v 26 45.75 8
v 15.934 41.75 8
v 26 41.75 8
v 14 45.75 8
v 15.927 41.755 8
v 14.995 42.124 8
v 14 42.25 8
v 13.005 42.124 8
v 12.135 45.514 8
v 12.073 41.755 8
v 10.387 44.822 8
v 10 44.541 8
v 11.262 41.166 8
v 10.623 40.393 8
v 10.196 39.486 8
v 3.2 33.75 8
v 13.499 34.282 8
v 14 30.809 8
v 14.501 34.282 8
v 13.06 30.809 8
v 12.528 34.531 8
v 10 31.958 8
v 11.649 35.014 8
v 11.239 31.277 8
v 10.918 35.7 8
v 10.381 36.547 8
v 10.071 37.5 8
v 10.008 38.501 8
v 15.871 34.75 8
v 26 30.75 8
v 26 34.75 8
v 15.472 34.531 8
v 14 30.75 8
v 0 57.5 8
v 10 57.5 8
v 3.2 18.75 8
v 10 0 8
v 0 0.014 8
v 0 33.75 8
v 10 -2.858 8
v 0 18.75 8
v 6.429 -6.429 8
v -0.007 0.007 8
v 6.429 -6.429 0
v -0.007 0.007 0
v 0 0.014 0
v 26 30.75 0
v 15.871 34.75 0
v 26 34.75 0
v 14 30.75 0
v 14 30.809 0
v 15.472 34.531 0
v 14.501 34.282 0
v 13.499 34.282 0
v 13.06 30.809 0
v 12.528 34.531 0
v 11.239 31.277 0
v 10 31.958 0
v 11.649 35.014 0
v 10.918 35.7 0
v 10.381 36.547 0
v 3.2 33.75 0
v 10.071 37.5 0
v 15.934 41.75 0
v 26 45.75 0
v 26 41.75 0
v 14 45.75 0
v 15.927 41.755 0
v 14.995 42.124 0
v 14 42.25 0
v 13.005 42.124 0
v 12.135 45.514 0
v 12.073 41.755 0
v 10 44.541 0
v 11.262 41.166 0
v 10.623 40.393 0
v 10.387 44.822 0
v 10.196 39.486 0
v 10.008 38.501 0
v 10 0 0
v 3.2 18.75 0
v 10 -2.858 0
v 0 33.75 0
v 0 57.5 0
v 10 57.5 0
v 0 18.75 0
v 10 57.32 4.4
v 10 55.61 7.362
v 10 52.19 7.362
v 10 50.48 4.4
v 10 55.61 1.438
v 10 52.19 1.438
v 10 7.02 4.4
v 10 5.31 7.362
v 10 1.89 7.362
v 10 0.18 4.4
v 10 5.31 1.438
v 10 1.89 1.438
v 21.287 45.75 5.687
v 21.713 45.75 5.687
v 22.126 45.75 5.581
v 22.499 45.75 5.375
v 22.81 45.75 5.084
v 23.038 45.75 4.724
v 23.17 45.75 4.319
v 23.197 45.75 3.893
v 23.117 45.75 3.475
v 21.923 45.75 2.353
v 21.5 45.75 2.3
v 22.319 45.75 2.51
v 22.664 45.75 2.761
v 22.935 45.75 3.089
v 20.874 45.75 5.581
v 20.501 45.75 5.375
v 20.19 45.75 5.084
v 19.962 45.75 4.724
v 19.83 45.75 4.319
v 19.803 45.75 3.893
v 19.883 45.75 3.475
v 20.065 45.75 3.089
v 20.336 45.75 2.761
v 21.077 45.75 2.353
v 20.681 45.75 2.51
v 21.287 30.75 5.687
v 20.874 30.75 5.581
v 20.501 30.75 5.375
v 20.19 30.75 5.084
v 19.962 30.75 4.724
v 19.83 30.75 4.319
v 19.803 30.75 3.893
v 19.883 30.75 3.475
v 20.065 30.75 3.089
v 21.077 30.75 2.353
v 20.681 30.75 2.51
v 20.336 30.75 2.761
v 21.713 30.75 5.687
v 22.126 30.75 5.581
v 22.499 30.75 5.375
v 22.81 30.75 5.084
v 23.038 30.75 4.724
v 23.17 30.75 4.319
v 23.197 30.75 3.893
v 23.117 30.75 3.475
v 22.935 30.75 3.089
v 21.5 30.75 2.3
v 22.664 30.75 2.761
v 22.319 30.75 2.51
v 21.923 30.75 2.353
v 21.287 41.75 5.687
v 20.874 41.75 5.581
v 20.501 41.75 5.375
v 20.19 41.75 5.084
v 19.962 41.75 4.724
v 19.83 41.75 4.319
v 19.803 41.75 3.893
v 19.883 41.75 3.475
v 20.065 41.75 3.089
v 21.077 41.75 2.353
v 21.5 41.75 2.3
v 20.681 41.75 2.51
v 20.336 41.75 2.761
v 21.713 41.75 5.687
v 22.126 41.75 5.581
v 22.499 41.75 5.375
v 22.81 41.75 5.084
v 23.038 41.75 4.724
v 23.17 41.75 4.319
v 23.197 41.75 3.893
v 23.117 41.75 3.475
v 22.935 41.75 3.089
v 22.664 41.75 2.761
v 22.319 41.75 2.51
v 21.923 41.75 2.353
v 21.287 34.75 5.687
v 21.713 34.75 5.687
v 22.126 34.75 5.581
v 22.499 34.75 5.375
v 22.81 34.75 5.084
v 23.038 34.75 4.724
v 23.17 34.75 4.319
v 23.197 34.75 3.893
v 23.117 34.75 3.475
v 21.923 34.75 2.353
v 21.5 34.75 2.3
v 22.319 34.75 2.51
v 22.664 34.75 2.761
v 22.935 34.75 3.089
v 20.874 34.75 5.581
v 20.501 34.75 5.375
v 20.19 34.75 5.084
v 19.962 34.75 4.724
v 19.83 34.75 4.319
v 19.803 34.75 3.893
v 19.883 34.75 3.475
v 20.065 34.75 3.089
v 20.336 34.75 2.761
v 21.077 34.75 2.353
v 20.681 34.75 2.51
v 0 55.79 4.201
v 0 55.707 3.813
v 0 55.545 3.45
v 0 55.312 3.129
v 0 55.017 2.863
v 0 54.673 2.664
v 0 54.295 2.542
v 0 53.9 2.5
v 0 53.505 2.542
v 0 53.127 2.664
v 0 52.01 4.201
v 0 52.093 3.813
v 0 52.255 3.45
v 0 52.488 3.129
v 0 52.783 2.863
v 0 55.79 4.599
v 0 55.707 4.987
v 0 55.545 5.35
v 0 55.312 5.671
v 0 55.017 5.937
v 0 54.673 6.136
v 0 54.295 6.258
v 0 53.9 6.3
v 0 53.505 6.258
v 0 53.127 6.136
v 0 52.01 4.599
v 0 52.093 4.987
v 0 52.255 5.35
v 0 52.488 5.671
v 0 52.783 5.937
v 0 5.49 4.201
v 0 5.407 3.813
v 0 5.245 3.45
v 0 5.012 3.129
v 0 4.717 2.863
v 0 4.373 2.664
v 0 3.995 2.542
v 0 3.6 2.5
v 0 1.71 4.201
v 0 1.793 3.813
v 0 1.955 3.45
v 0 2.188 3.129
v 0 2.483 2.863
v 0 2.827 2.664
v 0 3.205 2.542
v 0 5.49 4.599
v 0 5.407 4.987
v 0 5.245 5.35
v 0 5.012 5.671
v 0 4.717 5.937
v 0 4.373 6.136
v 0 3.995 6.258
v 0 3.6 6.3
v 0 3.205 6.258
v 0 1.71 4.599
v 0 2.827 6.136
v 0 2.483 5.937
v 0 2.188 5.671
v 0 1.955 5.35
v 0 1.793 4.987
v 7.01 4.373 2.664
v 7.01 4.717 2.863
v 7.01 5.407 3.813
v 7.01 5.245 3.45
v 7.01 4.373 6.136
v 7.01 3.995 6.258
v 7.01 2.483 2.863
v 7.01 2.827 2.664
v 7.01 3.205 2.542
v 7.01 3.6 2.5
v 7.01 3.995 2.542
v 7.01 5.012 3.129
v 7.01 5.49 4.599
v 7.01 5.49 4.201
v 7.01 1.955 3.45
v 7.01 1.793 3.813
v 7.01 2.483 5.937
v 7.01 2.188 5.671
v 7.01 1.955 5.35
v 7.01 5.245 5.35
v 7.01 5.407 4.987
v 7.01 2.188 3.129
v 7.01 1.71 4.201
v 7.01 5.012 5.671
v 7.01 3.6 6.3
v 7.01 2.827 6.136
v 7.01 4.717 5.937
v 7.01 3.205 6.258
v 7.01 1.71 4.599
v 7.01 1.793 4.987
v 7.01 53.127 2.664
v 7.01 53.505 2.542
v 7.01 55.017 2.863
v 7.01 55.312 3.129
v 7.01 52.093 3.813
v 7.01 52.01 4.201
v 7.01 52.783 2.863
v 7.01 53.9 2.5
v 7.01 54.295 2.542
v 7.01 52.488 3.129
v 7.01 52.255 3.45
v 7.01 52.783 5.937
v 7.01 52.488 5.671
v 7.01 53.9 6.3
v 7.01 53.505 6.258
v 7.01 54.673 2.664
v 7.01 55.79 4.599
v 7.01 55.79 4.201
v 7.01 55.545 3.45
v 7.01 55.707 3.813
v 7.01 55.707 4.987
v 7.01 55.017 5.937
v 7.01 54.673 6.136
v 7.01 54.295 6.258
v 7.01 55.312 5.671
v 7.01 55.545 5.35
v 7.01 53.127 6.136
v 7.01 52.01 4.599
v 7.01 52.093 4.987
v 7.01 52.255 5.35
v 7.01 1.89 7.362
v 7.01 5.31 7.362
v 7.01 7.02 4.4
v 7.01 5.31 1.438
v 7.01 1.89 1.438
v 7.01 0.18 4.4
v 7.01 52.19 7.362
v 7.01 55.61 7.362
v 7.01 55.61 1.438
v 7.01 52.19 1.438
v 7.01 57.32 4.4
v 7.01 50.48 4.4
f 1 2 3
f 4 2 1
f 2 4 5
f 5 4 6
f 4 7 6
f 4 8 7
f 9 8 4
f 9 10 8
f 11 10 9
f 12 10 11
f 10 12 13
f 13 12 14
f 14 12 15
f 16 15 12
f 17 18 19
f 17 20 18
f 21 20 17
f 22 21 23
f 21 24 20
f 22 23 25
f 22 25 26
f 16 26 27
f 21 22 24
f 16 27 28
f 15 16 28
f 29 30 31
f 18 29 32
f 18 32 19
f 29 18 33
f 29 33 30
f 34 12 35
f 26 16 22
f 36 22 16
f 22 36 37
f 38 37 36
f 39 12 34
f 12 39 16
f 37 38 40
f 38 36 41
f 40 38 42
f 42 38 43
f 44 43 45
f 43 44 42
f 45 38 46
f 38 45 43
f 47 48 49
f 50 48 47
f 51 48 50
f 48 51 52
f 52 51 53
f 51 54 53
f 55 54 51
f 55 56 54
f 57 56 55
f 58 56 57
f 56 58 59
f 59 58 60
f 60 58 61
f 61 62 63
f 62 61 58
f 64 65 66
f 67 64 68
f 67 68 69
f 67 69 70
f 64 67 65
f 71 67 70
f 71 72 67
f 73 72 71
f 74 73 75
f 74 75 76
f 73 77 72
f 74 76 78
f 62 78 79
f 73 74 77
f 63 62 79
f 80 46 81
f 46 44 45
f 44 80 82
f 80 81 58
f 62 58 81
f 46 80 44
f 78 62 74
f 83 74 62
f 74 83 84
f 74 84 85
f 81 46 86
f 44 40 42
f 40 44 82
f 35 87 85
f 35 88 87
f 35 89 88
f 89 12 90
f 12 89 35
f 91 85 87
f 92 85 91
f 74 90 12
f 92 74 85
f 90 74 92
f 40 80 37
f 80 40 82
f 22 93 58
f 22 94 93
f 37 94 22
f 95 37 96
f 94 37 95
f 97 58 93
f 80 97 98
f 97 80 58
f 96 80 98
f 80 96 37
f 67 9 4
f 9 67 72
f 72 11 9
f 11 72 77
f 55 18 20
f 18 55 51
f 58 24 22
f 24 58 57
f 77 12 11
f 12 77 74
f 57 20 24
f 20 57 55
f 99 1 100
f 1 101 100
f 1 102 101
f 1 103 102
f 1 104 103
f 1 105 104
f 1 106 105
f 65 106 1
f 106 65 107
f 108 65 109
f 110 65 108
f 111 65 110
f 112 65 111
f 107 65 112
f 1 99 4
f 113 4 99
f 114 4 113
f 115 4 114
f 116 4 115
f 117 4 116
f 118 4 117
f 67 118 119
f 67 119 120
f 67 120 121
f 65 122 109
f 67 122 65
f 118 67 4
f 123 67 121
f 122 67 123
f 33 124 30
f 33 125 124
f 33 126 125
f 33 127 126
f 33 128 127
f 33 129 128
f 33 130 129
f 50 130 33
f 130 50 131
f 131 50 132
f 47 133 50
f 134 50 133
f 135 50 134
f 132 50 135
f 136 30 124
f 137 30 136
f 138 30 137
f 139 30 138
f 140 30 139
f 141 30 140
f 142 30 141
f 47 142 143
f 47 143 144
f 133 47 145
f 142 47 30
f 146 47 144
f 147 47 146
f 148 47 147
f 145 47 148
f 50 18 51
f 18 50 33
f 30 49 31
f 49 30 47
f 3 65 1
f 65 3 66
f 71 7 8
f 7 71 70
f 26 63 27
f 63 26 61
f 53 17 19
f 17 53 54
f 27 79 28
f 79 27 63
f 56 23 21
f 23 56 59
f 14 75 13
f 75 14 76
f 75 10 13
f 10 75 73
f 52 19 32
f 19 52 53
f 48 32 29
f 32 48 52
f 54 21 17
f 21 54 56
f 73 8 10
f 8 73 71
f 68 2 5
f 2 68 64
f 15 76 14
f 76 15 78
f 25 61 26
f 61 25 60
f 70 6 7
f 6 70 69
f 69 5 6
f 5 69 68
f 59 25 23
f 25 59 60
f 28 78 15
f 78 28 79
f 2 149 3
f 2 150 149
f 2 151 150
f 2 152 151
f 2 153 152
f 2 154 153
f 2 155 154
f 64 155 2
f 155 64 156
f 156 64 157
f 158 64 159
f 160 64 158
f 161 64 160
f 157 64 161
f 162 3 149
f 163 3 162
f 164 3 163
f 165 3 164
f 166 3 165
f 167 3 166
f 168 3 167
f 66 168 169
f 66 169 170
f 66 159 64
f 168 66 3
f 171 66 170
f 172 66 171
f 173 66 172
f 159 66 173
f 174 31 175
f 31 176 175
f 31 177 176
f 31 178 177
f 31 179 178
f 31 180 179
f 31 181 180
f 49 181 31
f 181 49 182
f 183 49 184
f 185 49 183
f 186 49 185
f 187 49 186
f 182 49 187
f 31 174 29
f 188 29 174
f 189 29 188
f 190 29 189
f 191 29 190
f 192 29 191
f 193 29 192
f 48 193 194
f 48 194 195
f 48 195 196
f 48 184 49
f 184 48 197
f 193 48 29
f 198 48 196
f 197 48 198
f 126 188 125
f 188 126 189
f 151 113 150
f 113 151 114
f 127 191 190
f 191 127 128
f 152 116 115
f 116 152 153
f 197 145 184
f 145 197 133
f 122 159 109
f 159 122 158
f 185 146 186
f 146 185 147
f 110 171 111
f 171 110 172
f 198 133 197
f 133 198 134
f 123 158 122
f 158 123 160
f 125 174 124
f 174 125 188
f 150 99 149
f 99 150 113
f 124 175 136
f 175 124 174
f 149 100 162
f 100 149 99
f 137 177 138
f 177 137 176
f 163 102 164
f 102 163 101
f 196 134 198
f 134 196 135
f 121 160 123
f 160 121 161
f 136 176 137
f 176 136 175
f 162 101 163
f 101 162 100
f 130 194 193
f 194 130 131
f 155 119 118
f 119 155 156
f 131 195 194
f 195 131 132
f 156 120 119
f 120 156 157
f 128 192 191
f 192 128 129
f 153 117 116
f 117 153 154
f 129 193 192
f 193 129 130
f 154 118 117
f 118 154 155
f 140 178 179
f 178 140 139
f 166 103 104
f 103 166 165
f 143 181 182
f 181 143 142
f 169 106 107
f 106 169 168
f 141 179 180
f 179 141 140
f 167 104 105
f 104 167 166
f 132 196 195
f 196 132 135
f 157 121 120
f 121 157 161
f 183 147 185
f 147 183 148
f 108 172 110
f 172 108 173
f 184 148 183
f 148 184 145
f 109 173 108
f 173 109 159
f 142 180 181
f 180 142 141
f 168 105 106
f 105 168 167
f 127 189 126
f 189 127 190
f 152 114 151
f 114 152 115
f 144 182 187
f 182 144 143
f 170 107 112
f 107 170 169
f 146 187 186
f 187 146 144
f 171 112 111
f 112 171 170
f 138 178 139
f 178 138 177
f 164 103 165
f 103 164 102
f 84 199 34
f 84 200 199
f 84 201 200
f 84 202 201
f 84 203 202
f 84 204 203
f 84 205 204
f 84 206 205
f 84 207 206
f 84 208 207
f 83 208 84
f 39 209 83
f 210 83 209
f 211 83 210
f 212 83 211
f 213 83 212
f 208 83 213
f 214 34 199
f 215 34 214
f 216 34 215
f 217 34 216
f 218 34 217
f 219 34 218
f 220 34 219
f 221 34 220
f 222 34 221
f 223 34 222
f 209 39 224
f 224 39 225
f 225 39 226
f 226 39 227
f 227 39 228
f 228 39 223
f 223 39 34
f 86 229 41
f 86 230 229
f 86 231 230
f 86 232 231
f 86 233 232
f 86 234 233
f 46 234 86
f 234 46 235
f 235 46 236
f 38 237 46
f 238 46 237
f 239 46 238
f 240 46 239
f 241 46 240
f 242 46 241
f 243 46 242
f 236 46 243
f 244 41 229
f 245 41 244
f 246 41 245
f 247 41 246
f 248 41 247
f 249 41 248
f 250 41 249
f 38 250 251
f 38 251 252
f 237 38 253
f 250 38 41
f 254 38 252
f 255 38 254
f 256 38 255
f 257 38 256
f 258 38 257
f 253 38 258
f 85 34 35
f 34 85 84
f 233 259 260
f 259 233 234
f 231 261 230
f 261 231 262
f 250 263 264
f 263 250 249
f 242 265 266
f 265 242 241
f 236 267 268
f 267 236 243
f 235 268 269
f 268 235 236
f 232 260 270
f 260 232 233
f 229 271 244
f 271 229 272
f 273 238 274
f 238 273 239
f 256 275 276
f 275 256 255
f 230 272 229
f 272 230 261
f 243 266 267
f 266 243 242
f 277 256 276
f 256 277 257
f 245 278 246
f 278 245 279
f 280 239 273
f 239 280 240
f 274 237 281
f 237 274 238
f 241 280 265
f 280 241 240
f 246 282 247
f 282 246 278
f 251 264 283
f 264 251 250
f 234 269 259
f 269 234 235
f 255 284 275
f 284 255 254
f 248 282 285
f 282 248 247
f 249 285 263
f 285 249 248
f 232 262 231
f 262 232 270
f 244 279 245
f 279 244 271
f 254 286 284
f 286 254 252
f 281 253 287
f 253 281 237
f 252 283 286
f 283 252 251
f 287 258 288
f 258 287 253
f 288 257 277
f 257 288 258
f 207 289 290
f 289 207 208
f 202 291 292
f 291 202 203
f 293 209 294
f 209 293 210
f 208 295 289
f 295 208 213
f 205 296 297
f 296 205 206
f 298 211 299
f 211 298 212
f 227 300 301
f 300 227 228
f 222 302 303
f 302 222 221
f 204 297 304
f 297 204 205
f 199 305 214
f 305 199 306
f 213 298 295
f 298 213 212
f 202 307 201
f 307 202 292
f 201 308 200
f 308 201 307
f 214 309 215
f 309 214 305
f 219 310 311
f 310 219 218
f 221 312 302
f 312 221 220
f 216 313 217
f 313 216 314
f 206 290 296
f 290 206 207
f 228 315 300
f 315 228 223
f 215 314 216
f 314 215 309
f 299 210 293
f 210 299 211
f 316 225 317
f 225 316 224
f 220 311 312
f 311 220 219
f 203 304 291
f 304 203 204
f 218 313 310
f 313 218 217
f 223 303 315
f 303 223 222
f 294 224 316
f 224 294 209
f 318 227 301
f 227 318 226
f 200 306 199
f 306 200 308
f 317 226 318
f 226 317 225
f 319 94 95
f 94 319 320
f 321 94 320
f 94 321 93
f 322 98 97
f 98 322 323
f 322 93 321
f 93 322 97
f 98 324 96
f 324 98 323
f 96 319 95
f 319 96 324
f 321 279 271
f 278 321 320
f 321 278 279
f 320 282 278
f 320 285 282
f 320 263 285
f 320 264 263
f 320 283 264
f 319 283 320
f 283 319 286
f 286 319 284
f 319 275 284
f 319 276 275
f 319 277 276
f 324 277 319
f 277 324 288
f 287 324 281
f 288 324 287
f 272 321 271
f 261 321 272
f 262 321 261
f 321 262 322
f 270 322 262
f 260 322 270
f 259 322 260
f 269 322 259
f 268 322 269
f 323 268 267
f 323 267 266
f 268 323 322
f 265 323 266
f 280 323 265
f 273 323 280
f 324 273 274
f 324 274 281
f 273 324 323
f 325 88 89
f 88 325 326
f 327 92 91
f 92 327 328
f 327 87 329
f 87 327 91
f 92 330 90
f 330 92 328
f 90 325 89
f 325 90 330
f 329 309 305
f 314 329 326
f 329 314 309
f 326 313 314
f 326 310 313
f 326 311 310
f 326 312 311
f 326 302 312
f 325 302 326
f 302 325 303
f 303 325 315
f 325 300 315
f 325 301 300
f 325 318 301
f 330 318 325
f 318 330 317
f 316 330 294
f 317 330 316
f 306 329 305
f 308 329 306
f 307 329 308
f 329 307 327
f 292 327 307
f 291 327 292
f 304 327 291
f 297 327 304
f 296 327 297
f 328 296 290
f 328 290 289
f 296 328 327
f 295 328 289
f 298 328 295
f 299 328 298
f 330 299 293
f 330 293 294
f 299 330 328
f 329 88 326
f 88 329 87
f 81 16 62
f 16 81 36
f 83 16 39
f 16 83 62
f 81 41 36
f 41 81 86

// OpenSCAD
// file: library/component-data.scad
// ========================================================================================
// Robori Mendel
// Dimensions of standard components
// GNU GPL v3
//
// Contact : support@robori.com
// Reference : http://www.robori.com/documentation/Mendel
//
// History :
// 31 Jan 2015 - First version
// ========================================================================================

// Linear bearing LM8UU
LM8UU_L = 24;
LM8UU_OD = 15;
LM8UU_ID = 8;

// Pulley GT2
PULLEY_GT2_ID = 5;
PULLEY_GT2_OD = 18;
PULLEY_GT2_L = 18.5;
PULLEY_GT2_FLANGE_L = 1.5;
PULLEY_GT2_TEETH_L = 7.5;
PULLEY_GT2_TEETH_OD = 10;
PULLEY_GT2_HUB_L =  PULLEY_GT2_L - PULLEY_GT2_FLANGE_L - PULLEY_GT2_TEETH_L;		// = 9.5

// Nylock nut
NYLOCK_NUT_M5_H = 5;

// NEMA 17
NEMA17_L = 42;
NEMA17_SCREW_FROM_EDGE = (42 - 31)/2;
NEMA17_SCREW_SIZE = 3;

// Fan 40mm x 40mm
FAN40_L = 40;
FAN40_ID = 38;
FAN40_SCREW_D = 3.4;
FAN40_SCREW_FROM_EDGE = 4;

// Washer
WASHER_M3_ID = 3.2;
WASHER_M3_OD = 6;
WASHER_M3_H = 0.5;
// file: library/library_3d.scad
// ========================================================================================
// Robori Mendel
// General 3D library
// GNU GPL v3
//
// Contact : support@robori.com
// Reference : http://www.robori.com/documentation/Mendel
//
// History :
// 2013 - First version
// ========================================================================================

lib3d_fn = 50;

// TESTING
//lib3d_hex_nut_recess(3);
//lib3d_round_cube(10, 8, 10, 1, true, false, true, false);


// Hexagonal nut recess
module lib3d_hex_nut_recess(size)
{
	length = 0.8*size;
	hex_r = 1.8*size/2;
	cylinder(h=length, r=hex_r, center=false, $fn=6);
}

// Cube with customized rounded corners
module lib3d_round_cube(x, y, z, rad, left_top=true, left_bottom=true, right_top=true, right_bottom=true)
{
	rx = x/2 - rad + 0.02;
	ry = y/2 - rad + 0.02;

	translate([x/2, y/2, 0]) difference()
	{	
		translate([-x/2, -y/2, 0]) cube([x, y, z]);
		if (left_top)
			translate([-rx, ry, -1]) rotate([0, 0, 90]) __lib3d_round_corner(rad, z + 2);
		if (left_bottom)
			translate([-rx, -ry, -1]) rotate([0, 0, 180]) __lib3d_round_corner(rad, z + 2);
		if (right_top)
			translate([rx, ry, -1]) __lib3d_round_corner(rad, z + 2);
		if (right_bottom)
			translate([rx, -ry, -1]) rotate([0, 0, 270]) __lib3d_round_corner(rad, z + 2);
	}
}

// Helper
module __lib3d_round_corner(rad, height)
{
	difference()
	{
		cube([rad, rad, height]);
		cylinder(h=height, r=rad, center=false, $fn=lib3d_fn);
	}
}
// file: library/component.scad
// ========================================================================================
// Robori Mendel
// RP library
// GNU GPL v3
//
// Contact : support@robori.com
// Reference : http://www.robori.com/documentation/Mendel
//
// History :
// 31 Jan 2015 - First version
// ========================================================================================

include <component-data.scad>

component_fn = 25;

// Rod clamp
module clamp(in_dia, out_dia, leg_length, leg_space, height, screw_dia, screw_dist_from_end)
{
	difference()
	{
		union()
		{
			cylinder(h=height, r=out_dia/2, center=false, $fn=component_fn);
			translate([-out_dia/2, -in_dia/2 - leg_length, 0]) cube([out_dia, in_dia/2 + leg_length, height]);
		}
		// hole
		translate([0, 0, -1]) cylinder(h=height + 2, r=in_dia/2, center=false, $fn=component_fn);
		// leg space
		translate([-leg_space/2, -in_dia/2 - leg_length - 1, -1]) cube([leg_space, in_dia/2 + leg_length + 1, height + 2]);
		// screw hole
		translate([-out_dia/2 - 1, -in_dia/2 - leg_length + screw_dist_from_end, height/2]) rotate([0, 90, 0]) cylinder(h=out_dia + 2, r=screw_dia/2, center=false, $fn=component_fn);
	}
}

// LM8UU holder
lm8uu_holder_wall_t = 3;
lm8uu_holder_cone_l = 2;
lm8uu_holder_slot_w = 9;
lm8uu_holder_id = LM8UU_OD - 0.1;
lm8uu_holder_l = LM8UU_L + lm8uu_holder_cone_l;
lm8uu_holder_w = LM8UU_OD + 2*lm8uu_holder_wall_t;
lm8uu_holder_h = LM8UU_OD + 2*lm8uu_holder_cone_l;

module lm8uu_holder()
{
	cone_d1 = 0;
	cone_d2 = LM8UU_OD + 2*lm8uu_holder_cone_l;
	cone_h = cone_d2/2;

	difference()
	{
		// Block
		cube([lm8uu_holder_l, lm8uu_holder_w, lm8uu_holder_h]);
		// Cylinder
		translate([-1, lm8uu_holder_w/2, lm8uu_holder_cone_l + LM8UU_OD/2]) rotate([0, 90, 0]) cylinder(r=lm8uu_holder_id/2, h=lm8uu_holder_l + 2, center=false, $fn=component_fn);
		// Cone
		translate([lm8uu_holder_l - cone_h + 0.01, lm8uu_holder_w/2, lm8uu_holder_cone_l + LM8UU_OD/2]) rotate([0, 90, 0]) cylinder(r1=cone_d1/2, r2=cone_d2/2, h=cone_h, center=false, $fn=component_fn);
		// Slot
		translate([-1, lm8uu_holder_w/2 - lm8uu_holder_slot_w/2, lm8uu_holder_h - lm8uu_holder_cone_l*2 - 1]) cube([lm8uu_holder_l + 2, lm8uu_holder_slot_w, lm8uu_holder_cone_l*2 + 2]);
	}
}
// main file
// ========================================================================================
// Robori Mendel
// LCD clamp left and right for RepRapDiscount 2004 smart controller
// GNU GPL v3
//
// Contact : support@robori.com
// Reference : http://www.robori.com/documentation/Mendel
//
// History :
// 22 May 2015 - First version
// ========================================================================================

include <library/component.scad>
include <library/library_3d.scad>

$fn = 30;

clamp_body_l = 10;
clamp_body_w = 57.5;
clamp_foot_l = clamp_body_l;
clamp_foot_w = (clamp_body_l + 2.87169)*sin(45);
clamp_h = 8;
clamp_screw_d = 3 + 0.4;
clamp_lcd_screw_d = 3 + 0.8;
clamp_lcd_screw_dist = 3.6;
clamp_dist = 38.25;

clamp_left_slot_l = 3.2 + 0.8;
clamp_left_slot_w = 26.4 + 2*2;
clamp_left_slot_center_y = 9.25 + 26.4/2;

clamp_right_slot_l = 3.2;
clamp_right_slot_w = 15	;
clamp_right_slot_center_y = 18.75 + 15/2;

// Uncomment each one to generate left or right clamp
//lcd_clamp_left();
lcd_clamp_right();

module lcd_clamp_left()
{
	difference()
	{
		lcd_clamp();
		// lcd screw holes
		translate([-1, clamp_lcd_screw_dist, clamp_lcd_screw_dist]) rotate([0, 90, 0]) cylinder(r=clamp_lcd_screw_d/2, h=clamp_body_l + 2, center=false);
		translate([-1, clamp_body_w - clamp_lcd_screw_dist, clamp_lcd_screw_dist]) rotate([0, 90, 0]) cylinder(r=clamp_lcd_screw_d/2, h=clamp_body_l + 2, center=false);
		// lcd nut recesses
		translate([clamp_body_l + 0.05, clamp_lcd_screw_dist, clamp_lcd_screw_dist]) rotate([0, -90, 0]) rotate([0, 0, 90]) lib3d_hex_nut_recess(clamp_lcd_screw_d);
		translate([clamp_body_l + 0.05, clamp_body_w - clamp_lcd_screw_dist, clamp_lcd_screw_dist]) rotate([0, -90, 0]) rotate([0, 0, 90]) lib3d_hex_nut_recess(clamp_lcd_screw_d);
		// slot
		translate([-1, clamp_left_slot_center_y - clamp_left_slot_w/2, -1]) cube([clamp_left_slot_l + 1, clamp_left_slot_w, clamp_h + 2]);
	}
}

module lcd_clamp_right()
{
	difference()
	{
		lcd_clamp();
		// lcd screw holes
		translate([-1, clamp_lcd_screw_dist, clamp_h - clamp_lcd_screw_dist]) rotate([0, 90, 0]) cylinder(r=clamp_lcd_screw_d/2, h=clamp_body_l + 2, center=false);
		translate([-1, clamp_body_w - clamp_lcd_screw_dist, clamp_h - clamp_lcd_screw_dist]) rotate([0, 90, 0]) cylinder(r=clamp_lcd_screw_d/2, h=clamp_body_l + 2, center=false);
		// lcd nut recesses
		translate([clamp_body_l + 0.05, clamp_lcd_screw_dist, clamp_h - clamp_lcd_screw_dist]) rotate([0, -90, 0]) rotate([0, 0, 90]) lib3d_hex_nut_recess(clamp_lcd_screw_d);
		translate([clamp_body_l + 0.05, clamp_body_w - clamp_lcd_screw_dist, clamp_h - clamp_lcd_screw_dist]) rotate([0, -90, 0]) rotate([0, 0, 90]) lib3d_hex_nut_recess(clamp_lcd_screw_d);
		// slot
		translate([-1, clamp_right_slot_center_y - clamp_right_slot_w/2, -1]) cube([clamp_right_slot_l + 1, clamp_right_slot_w, clamp_h + 2]);
	}
}

module lcd_clamp()
{
	in_dia = 8;
	out_dia = 8 + 2*3.5;
	leg_length = 8;
	leg_space = 7;
	height = clamp_h;
	screw_dia = clamp_screw_d;
	screw_dist_from_end = 4.5;

	union()
	{
		// body
		cube([clamp_body_l, clamp_body_w, clamp_h]);
		// foot
		difference()
		{
			rotate([0, 0, 45]) translate([0, -clamp_foot_w + 0.01, 0]) cube([clamp_foot_l, clamp_foot_w, clamp_h]);
			translate([clamp_body_l, -clamp_foot_w + 5, -1]) cube([10, clamp_foot_w, clamp_h + 2]);
		}
		// clamp
		translate([clamp_body_l + in_dia/2, clamp_dist, 0]) rotate([0, 0, 90]) clamp(in_dia, out_dia, leg_length, leg_space, height, screw_dia, screw_dist_from_end);
	}
}
